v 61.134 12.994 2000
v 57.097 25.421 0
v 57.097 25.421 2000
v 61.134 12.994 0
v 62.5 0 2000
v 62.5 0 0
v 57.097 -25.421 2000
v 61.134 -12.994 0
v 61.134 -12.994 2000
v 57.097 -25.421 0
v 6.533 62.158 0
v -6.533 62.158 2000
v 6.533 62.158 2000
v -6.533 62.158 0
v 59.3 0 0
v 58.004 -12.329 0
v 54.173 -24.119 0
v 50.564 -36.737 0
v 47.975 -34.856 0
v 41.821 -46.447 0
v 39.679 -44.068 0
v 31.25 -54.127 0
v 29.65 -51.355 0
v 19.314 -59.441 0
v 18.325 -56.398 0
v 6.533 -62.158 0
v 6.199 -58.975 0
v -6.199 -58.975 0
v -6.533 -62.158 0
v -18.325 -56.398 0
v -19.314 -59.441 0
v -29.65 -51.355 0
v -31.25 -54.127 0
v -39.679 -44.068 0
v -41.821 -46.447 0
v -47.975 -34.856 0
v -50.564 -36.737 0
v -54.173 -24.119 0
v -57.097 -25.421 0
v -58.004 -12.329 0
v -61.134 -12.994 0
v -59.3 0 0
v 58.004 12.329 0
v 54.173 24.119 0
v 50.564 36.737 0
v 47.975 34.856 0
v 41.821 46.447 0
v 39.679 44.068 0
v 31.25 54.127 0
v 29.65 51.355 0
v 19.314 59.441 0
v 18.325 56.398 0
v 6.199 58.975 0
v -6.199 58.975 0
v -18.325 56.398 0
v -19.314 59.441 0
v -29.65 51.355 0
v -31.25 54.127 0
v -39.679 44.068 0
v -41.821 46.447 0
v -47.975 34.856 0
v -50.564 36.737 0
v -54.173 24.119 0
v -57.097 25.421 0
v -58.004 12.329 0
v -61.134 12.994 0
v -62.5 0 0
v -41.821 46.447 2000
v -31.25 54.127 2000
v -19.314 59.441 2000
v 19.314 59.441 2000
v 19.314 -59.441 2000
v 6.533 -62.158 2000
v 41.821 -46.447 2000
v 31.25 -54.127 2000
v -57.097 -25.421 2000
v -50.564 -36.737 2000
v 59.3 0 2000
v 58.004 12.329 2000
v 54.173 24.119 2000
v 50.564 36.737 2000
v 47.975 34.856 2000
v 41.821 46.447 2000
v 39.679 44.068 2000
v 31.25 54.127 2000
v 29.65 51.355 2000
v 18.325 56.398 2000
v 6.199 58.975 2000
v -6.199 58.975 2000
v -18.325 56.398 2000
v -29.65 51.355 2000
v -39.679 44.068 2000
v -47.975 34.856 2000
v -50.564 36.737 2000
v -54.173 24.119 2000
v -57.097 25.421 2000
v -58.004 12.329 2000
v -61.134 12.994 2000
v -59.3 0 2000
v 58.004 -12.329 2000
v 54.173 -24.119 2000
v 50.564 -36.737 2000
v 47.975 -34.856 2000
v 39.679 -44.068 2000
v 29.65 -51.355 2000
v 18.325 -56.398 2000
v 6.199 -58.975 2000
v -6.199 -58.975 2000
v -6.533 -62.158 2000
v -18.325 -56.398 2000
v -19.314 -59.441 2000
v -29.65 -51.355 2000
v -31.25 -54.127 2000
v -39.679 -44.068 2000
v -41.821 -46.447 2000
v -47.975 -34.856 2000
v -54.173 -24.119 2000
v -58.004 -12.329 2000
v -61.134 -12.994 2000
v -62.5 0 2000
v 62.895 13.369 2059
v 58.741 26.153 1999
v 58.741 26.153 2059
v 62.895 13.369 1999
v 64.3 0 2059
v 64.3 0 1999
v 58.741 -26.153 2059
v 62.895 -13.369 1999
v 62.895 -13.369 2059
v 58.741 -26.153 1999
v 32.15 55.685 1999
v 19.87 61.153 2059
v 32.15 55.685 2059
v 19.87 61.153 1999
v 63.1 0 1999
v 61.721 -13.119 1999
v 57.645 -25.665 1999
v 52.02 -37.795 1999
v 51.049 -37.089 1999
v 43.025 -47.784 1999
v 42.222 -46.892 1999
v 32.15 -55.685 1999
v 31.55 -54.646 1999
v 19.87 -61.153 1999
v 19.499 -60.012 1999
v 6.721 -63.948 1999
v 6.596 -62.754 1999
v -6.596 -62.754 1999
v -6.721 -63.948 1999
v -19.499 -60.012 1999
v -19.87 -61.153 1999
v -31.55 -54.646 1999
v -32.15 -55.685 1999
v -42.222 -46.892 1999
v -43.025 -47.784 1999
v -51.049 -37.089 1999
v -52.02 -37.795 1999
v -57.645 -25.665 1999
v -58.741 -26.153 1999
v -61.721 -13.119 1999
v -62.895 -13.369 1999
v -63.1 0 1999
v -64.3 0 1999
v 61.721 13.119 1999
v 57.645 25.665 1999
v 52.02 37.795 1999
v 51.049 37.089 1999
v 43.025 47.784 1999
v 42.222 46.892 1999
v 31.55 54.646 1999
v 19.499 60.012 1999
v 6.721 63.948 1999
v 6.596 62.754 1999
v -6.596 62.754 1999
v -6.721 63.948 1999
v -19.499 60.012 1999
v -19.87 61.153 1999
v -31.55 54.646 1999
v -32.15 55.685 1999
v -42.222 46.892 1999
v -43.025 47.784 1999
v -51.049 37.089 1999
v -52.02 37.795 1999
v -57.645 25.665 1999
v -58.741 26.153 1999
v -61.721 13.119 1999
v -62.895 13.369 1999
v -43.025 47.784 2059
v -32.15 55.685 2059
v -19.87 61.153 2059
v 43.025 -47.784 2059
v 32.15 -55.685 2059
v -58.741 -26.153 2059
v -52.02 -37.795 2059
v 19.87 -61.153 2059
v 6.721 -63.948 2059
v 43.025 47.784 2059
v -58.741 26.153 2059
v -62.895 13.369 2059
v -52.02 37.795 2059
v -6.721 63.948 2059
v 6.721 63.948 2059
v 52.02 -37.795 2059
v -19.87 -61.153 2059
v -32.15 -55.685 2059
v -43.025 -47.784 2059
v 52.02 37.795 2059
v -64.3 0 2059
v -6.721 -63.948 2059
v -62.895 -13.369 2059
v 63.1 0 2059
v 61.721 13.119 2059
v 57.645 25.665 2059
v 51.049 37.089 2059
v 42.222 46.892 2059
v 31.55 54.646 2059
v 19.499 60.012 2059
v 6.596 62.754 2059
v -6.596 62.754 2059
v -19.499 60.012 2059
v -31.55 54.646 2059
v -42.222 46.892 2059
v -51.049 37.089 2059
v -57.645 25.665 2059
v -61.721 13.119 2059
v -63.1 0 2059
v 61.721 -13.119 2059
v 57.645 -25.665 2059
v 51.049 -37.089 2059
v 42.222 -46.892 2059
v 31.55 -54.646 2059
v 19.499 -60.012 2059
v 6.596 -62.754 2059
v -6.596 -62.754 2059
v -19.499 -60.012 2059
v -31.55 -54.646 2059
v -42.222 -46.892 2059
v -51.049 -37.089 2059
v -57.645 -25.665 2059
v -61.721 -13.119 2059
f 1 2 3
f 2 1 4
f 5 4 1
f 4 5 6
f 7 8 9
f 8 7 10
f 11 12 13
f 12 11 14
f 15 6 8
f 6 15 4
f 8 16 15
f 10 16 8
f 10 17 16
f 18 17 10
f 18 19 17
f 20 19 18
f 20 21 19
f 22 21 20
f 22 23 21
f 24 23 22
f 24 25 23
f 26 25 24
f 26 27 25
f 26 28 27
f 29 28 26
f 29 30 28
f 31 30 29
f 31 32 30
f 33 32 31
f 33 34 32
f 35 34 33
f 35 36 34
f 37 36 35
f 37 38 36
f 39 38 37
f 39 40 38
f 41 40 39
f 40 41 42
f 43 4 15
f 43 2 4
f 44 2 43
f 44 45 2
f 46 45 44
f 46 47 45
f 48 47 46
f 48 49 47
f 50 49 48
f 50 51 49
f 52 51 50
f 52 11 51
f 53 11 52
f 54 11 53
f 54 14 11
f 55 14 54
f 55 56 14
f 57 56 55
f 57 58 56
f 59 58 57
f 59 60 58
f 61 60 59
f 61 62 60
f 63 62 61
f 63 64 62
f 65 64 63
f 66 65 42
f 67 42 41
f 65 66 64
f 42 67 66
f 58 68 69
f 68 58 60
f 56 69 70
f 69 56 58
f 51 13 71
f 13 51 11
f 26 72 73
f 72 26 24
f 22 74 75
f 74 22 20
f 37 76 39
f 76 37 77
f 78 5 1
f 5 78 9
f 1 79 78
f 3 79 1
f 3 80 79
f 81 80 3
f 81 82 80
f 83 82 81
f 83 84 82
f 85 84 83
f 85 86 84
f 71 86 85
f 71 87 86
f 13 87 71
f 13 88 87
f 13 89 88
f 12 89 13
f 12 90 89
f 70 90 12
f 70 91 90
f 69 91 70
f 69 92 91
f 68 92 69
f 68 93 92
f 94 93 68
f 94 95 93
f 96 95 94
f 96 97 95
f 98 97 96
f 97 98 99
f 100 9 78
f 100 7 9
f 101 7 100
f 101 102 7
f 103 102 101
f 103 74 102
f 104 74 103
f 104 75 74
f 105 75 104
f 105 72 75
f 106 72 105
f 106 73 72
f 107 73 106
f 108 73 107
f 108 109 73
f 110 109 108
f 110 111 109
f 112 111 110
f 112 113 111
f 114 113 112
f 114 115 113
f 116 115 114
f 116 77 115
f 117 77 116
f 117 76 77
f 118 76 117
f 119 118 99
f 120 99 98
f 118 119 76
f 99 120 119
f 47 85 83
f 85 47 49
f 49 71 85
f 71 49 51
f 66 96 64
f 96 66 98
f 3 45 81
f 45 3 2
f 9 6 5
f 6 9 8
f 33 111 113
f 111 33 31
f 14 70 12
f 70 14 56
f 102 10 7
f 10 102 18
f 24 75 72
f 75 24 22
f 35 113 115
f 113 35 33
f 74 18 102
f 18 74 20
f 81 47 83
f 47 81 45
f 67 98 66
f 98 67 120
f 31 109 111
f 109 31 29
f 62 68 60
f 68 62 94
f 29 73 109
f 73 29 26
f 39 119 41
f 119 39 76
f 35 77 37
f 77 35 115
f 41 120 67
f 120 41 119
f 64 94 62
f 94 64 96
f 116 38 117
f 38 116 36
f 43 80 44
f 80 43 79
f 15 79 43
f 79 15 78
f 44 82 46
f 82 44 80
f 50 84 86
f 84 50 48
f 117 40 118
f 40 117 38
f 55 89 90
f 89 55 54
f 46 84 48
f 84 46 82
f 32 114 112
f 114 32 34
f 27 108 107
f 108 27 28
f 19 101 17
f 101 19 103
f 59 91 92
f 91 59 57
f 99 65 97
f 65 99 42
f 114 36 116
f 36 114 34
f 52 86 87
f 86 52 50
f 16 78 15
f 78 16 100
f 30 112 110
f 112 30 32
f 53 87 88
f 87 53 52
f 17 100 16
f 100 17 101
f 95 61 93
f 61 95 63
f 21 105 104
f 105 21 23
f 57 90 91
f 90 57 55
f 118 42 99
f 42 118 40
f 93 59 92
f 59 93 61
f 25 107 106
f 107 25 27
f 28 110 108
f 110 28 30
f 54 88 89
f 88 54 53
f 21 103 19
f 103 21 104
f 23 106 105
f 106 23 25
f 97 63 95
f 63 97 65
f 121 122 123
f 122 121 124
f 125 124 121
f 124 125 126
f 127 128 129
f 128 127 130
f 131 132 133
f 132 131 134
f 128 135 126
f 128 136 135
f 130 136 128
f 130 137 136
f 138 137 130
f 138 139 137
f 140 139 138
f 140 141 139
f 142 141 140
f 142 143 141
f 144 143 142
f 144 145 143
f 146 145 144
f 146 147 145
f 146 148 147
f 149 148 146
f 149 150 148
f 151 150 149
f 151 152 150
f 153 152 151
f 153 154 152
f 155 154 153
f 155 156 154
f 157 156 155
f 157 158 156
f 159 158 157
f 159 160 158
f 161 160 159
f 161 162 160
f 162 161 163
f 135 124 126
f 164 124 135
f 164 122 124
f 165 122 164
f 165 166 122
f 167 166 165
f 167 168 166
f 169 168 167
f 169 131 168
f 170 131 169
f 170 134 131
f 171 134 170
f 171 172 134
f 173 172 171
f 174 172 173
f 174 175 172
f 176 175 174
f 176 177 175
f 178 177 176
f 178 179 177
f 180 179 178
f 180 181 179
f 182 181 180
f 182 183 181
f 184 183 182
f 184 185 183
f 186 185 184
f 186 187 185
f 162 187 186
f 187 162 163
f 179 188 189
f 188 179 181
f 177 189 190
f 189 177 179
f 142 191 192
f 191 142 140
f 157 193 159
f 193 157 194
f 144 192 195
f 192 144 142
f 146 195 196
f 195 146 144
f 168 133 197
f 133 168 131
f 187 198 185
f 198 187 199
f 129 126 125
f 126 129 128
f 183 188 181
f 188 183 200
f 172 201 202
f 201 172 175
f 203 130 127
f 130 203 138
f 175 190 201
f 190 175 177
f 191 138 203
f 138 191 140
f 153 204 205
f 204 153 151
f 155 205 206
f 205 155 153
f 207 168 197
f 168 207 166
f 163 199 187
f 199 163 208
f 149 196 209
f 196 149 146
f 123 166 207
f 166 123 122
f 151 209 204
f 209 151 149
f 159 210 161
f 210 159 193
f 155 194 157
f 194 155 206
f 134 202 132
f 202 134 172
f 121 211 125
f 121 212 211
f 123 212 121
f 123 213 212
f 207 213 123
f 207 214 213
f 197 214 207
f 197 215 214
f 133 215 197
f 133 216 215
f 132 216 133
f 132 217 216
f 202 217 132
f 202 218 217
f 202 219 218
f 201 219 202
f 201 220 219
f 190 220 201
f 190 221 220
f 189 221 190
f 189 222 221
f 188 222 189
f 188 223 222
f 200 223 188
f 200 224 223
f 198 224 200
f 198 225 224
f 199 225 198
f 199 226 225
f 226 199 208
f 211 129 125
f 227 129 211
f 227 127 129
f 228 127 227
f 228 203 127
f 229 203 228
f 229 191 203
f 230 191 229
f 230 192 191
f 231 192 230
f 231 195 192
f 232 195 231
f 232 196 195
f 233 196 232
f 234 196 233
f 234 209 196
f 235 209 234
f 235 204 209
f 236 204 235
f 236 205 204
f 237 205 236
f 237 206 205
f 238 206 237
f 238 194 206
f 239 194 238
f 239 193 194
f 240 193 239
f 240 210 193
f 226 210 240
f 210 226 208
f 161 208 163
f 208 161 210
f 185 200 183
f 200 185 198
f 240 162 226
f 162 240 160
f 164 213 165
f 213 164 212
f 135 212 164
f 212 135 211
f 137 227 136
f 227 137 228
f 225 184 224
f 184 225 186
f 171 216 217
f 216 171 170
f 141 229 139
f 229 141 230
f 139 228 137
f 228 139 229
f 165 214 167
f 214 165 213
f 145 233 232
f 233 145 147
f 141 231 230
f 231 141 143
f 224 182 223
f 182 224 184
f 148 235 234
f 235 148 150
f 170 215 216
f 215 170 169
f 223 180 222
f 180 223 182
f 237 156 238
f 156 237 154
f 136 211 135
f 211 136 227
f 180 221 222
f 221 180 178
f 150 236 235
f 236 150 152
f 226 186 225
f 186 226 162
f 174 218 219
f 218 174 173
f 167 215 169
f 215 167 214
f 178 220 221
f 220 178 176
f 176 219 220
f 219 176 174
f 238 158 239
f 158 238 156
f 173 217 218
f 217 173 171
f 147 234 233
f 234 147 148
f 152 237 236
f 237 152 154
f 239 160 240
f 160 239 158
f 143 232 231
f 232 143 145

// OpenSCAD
// Parameters
pipe_standard = 0; //[0:1:1]
nominal_diameter_mm = 125; //[60:250:1]
length_mm = 2000; //[1000:4000:10]
pipe_od = 125; //[60:250:1]
pipe_wall = 3.2; //[1.6:6.4:0.1]
fitting_length = 60; //[30:120:1]
fitting_wall_extra = 1.8; //[0.8:4:0.1]
fitting_socket_clearance = 0.6; //[0.2:1.2:0.1]
overlap = 1; //[0.5:2:0.1]

// HT Pipe - complete geometry
module ht_pipe() {
  color([0.85, 0.85, 0.8]) {
    // Pipe body
    difference() {
      cylinder(h=length_mm, r=pipe_od/2, center=false);
      translate([0, 0, -overlap])
        cylinder(h=length_mm + overlap*2, r=pipe_od/2 - pipe_wall, center=false);
    }
    
    // End fitting
    difference() {
      translate([0, 0, length_mm - overlap])
        cylinder(h=fitting_length, r=pipe_od/2 + fitting_wall_extra, center=false);
      translate([0, 0, length_mm - overlap - overlap])
        cylinder(h=fitting_length + overlap*2, r=pipe_od/2 + fitting_socket_clearance, center=false);
    }
  }
}

// Assembly
module assembly() {
  ht_pipe();
}

assembly();
